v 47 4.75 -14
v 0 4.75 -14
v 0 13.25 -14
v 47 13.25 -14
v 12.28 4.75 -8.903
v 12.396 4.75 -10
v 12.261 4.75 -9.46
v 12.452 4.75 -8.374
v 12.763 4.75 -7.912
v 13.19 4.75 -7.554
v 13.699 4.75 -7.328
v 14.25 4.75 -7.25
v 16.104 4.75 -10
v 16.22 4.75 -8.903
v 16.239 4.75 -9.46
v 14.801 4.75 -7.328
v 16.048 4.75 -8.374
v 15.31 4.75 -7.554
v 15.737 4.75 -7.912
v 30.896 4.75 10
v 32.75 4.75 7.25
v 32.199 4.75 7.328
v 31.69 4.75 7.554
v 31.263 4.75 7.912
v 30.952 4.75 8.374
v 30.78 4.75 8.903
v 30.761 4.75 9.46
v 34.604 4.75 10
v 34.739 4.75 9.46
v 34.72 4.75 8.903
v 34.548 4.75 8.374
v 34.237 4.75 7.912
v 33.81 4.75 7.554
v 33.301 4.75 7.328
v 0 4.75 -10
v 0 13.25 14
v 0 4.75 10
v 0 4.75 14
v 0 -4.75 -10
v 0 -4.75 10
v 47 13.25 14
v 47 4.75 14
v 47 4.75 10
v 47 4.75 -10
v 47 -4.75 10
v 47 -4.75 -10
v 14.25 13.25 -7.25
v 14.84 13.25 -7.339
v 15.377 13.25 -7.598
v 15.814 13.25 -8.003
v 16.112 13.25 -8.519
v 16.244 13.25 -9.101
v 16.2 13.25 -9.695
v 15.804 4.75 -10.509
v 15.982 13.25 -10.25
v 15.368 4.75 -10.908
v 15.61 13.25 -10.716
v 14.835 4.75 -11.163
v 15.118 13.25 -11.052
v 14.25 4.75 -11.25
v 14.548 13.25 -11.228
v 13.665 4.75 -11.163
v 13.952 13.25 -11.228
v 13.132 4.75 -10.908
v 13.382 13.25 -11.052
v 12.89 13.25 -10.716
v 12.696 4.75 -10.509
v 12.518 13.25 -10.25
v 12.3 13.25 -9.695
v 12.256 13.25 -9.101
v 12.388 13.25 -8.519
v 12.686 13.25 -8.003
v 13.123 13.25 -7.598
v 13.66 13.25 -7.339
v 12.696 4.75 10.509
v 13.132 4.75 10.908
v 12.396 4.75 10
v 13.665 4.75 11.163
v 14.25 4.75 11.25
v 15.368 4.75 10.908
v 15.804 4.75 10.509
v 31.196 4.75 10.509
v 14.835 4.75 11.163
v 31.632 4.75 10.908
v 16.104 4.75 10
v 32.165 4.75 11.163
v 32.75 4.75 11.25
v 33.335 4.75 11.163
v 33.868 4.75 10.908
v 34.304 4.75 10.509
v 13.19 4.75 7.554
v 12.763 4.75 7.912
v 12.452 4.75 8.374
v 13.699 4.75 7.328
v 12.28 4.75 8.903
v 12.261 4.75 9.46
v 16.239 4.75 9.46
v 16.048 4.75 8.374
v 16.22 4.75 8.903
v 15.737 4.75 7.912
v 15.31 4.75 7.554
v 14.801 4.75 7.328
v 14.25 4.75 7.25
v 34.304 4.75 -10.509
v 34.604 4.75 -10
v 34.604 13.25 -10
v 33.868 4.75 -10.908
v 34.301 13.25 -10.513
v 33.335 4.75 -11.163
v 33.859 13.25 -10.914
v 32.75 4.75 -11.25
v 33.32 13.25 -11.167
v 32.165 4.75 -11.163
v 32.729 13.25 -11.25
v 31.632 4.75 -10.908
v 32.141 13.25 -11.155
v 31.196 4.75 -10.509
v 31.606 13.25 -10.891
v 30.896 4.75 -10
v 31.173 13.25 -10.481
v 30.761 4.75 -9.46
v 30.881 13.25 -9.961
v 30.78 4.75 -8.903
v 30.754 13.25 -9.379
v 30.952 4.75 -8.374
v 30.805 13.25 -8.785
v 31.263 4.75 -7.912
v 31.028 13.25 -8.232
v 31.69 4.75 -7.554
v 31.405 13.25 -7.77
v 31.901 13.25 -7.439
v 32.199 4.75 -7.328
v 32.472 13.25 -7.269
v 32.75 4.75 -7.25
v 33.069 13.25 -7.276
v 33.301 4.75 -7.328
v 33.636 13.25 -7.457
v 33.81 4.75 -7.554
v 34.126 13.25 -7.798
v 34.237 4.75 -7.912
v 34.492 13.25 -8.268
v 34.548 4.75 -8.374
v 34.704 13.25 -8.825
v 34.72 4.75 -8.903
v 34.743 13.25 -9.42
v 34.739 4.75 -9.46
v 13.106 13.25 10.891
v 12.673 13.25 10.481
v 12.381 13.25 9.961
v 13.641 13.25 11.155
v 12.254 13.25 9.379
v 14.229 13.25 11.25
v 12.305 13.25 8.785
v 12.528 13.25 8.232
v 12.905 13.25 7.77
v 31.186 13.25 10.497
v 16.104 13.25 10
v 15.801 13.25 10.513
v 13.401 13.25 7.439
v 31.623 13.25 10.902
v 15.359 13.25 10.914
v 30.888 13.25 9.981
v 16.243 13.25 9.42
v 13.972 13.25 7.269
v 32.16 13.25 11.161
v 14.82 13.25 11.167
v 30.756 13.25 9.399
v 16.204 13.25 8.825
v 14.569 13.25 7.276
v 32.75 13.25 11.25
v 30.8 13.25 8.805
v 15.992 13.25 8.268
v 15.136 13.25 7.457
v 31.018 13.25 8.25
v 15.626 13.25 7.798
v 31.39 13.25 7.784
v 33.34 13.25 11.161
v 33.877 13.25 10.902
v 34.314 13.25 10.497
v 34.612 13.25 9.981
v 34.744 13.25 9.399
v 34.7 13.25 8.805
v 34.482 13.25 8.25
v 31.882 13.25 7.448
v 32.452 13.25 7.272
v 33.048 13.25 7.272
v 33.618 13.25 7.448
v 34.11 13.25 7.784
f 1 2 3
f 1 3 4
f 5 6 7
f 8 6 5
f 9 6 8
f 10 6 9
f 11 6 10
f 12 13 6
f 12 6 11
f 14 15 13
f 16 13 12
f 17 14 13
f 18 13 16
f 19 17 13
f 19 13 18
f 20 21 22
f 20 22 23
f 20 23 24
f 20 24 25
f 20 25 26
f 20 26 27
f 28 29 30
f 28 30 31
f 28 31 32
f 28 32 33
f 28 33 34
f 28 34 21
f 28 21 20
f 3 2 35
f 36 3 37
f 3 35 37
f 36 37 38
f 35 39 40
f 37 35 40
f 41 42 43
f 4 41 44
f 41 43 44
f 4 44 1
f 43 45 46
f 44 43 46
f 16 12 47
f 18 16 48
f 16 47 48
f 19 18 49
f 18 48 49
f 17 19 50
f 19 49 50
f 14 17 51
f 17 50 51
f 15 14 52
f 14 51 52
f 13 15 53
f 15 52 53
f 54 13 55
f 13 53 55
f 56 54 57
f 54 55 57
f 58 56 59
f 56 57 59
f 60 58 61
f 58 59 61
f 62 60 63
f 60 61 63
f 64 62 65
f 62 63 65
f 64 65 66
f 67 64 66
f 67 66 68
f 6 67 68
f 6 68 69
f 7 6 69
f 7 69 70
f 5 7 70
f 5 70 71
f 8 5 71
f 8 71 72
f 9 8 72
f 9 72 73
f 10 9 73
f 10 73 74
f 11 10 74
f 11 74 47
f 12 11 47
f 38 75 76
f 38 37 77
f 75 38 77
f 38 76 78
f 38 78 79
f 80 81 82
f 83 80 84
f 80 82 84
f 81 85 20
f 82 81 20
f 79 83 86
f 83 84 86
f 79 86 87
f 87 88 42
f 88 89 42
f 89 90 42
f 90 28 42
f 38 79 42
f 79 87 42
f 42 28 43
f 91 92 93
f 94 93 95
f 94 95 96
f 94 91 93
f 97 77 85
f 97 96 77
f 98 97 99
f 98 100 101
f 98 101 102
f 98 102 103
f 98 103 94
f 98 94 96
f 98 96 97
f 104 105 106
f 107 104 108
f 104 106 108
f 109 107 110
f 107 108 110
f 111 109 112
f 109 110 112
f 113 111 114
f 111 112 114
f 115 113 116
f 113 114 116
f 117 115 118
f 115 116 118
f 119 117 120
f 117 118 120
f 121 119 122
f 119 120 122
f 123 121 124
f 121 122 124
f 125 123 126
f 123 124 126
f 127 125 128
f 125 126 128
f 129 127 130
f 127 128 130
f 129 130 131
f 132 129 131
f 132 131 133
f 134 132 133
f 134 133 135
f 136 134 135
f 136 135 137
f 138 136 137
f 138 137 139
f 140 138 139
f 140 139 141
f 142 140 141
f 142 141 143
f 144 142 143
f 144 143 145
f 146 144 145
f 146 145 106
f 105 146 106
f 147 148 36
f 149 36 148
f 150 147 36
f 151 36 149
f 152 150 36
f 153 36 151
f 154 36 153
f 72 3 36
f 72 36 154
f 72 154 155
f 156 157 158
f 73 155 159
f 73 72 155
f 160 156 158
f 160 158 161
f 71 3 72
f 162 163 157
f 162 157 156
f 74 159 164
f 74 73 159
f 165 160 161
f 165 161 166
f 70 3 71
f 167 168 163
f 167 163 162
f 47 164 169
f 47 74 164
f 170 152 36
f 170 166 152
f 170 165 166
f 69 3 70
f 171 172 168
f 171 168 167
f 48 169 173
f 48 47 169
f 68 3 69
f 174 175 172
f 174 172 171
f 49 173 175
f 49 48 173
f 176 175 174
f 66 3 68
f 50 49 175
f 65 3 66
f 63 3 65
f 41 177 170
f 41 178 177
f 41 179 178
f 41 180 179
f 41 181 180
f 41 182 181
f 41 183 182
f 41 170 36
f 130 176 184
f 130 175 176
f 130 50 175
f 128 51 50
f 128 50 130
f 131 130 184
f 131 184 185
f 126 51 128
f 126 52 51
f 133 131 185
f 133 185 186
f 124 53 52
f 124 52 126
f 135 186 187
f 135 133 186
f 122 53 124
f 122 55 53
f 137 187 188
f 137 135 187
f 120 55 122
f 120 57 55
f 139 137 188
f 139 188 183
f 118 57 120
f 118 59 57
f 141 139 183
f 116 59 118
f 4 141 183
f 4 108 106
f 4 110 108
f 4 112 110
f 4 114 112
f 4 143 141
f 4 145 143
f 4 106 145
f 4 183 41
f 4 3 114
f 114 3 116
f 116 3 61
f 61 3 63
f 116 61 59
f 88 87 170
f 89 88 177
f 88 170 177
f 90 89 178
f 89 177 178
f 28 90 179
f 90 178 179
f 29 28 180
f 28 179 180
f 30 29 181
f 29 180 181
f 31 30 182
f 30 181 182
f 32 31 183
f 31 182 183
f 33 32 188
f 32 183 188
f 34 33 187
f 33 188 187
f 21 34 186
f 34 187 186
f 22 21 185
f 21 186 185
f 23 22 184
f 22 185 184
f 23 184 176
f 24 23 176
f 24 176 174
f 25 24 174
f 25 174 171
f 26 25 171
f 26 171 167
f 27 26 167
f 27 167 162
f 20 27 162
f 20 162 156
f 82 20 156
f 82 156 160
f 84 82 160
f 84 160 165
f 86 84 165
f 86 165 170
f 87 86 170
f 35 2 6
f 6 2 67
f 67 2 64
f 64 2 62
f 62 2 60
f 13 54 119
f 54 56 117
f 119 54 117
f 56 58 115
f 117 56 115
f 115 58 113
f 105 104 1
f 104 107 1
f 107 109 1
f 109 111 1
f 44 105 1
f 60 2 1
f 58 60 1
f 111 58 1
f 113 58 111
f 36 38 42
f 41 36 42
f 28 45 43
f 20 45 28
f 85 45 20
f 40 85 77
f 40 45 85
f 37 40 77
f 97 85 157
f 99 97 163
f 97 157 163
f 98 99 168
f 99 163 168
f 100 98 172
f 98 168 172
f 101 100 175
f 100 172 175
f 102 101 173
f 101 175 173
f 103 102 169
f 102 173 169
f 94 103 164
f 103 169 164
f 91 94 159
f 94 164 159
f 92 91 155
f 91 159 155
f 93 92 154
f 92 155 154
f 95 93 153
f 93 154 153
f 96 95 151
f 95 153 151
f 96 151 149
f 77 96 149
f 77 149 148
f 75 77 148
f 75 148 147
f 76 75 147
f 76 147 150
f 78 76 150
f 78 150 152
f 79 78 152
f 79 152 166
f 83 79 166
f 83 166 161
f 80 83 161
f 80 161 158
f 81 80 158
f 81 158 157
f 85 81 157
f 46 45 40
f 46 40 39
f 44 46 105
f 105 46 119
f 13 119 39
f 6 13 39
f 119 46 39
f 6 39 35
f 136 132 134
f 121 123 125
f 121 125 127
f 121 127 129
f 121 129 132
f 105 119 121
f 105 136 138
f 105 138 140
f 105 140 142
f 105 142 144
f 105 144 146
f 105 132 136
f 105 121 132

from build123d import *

# Parameters (mm, degrees)
SKETCH_1_W          = 20
SKETCH_1_H          = 9.5
EXTRUDE_1_DEPTH     = 47
SKETCH_2_W          = 47
SKETCH_2_H          = 20
SKETCH_2_H_2        = 4
EXTRUDE_2_DEPTH     = 8.5
SKETCH_3_R          = 2
CUT_EXTRUDE_1_DEPTH = 8.5


with BuildPart() as part:
    # 草图1 → 凸台-拉伸1 (new body)
    with BuildSketch(Plane(origin=(0, 0, 0), x_dir=(0, 0, -1), z_dir=(1, 0, 0))):
        Rectangle(SKETCH_1_W, SKETCH_1_H)
    extrude(amount=EXTRUDE_1_DEPTH)

    # 草图2 → 凸台-拉伸2 (add)
    with BuildSketch(Plane(origin=(0, 4.75, 0), x_dir=(1, 0, 0), z_dir=(0, 1, 0))):
        with Locations((23.5, 0)):
            Rectangle(SKETCH_2_W, SKETCH_2_H)
        with Locations((23.5, 12)):
            Rectangle(SKETCH_2_W, SKETCH_2_H_2)
        with Locations((23.5, -12)):
            Rectangle(SKETCH_2_W, SKETCH_2_H_2)
    extrude(amount=EXTRUDE_2_DEPTH)

    # 草图3 → 切除-拉伸1 (cut)
    with BuildSketch(Plane(origin=(0, 13.25, 0), x_dir=(1, 0, 0), z_dir=(0, 1, 0))):
        with Locations(Location((14.25, 9.25, 0), (0, 0, 270))):
            Circle(SKETCH_3_R)
        with Locations(Location((32.75, 9.25, 0), (0, 0, 22.024312837))):
            Circle(SKETCH_3_R)
        with Locations(Location((32.75, -9.25, 0), (0, 0, 270))):
            Circle(SKETCH_3_R)
        with Locations(Location((14.25, -9.25, 0), (0, 0, 337.975687163))):
            Circle(SKETCH_3_R)
    extrude(amount=-CUT_EXTRUDE_1_DEPTH, mode=Mode.SUBTRACT)


solid = part.part
